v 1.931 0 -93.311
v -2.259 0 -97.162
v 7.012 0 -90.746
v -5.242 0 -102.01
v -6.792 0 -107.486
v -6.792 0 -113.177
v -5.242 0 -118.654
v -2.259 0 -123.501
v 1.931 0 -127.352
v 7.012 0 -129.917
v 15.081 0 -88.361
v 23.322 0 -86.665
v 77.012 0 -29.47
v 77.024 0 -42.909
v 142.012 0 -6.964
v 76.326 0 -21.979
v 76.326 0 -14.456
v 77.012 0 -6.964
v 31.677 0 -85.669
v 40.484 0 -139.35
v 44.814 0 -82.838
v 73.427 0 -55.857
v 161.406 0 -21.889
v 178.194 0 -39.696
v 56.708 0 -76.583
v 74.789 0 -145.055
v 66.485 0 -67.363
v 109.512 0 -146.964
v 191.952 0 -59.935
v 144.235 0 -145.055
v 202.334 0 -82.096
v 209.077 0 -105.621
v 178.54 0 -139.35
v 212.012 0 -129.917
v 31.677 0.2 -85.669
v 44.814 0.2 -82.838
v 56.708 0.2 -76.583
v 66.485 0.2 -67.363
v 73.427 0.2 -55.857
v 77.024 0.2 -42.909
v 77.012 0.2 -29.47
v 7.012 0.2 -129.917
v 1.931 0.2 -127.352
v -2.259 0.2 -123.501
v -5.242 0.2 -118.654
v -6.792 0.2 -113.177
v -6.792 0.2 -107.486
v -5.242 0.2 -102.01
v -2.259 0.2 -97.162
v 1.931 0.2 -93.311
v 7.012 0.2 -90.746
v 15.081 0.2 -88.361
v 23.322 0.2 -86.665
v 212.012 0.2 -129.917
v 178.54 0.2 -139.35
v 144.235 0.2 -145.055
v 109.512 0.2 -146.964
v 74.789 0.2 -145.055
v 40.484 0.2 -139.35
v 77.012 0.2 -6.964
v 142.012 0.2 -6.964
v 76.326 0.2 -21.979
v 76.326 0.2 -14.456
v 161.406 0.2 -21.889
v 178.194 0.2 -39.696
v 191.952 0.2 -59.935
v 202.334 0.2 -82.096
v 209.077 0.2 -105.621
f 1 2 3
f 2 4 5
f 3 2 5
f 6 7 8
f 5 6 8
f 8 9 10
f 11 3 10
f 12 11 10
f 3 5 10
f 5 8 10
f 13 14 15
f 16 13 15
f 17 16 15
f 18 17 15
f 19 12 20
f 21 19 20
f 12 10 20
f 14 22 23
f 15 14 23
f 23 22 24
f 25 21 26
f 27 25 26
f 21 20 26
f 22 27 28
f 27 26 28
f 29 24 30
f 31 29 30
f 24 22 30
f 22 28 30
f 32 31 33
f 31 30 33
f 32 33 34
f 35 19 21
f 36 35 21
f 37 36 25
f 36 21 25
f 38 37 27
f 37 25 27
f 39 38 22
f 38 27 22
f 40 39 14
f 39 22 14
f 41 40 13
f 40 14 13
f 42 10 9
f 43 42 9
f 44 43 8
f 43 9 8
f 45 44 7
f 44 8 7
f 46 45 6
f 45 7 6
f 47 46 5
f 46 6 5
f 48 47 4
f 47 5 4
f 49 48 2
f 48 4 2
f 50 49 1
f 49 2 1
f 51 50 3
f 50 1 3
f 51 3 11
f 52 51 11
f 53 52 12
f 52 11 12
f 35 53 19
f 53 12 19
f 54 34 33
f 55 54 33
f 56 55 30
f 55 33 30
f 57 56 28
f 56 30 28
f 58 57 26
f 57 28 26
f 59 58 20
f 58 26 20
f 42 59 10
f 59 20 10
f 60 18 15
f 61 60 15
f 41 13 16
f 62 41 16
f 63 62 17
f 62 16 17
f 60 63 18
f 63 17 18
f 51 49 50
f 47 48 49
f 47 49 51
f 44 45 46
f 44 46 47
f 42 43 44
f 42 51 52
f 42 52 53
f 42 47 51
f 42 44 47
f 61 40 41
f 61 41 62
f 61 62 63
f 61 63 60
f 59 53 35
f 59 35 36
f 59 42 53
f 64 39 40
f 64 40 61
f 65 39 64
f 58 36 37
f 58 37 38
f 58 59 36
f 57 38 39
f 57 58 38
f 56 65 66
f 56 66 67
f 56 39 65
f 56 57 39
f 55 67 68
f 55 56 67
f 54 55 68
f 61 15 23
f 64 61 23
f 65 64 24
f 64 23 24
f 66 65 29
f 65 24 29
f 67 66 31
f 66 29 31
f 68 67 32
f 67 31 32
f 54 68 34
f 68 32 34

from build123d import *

# Parameters (mm, degrees)
BOSS_EXTRUDE1_DEPTH = 0.2


with BuildPart() as part:
    # Sketch1 → Boss-Extrude1 (new body)
    with BuildSketch(Plane(origin=(0, 0, 0), x_dir=(1, 0, 0), z_dir=(0, 1, 0))):
        with BuildLine():
            Line((77.011811156, 6.964256389), (142.011811156, 6.964256389))
            ThreePointArc((142.011811156, 6.964256389), (191.952101905, 59.934908511), (212.011811156, 129.917268368))
            ThreePointArc((212.011811156, 129.917268368), (109.511811156, 146.964256388), (7.011811156, 129.917268368))
            ThreePointArc((7.011811156, 129.917268368), (-6.988188844, 110.331559293), (7.011811156, 90.745850217))
            ThreePointArc((7.011811156, 90.745850217), (19.183532895, 87.425752447), (31.677095604, 85.669406772))
            ThreePointArc((31.677095604, 85.669406772), (66.484712456, 67.363163439), (77.011811156, 29.470302254))
            ThreePointArc((77.011811156, 29.470302254), (76.24065583, 18.217279321), (77.011811156, 6.964256389))
        make_face()
    extrude(amount=BOSS_EXTRUDE1_DEPTH)


solid = part.part
